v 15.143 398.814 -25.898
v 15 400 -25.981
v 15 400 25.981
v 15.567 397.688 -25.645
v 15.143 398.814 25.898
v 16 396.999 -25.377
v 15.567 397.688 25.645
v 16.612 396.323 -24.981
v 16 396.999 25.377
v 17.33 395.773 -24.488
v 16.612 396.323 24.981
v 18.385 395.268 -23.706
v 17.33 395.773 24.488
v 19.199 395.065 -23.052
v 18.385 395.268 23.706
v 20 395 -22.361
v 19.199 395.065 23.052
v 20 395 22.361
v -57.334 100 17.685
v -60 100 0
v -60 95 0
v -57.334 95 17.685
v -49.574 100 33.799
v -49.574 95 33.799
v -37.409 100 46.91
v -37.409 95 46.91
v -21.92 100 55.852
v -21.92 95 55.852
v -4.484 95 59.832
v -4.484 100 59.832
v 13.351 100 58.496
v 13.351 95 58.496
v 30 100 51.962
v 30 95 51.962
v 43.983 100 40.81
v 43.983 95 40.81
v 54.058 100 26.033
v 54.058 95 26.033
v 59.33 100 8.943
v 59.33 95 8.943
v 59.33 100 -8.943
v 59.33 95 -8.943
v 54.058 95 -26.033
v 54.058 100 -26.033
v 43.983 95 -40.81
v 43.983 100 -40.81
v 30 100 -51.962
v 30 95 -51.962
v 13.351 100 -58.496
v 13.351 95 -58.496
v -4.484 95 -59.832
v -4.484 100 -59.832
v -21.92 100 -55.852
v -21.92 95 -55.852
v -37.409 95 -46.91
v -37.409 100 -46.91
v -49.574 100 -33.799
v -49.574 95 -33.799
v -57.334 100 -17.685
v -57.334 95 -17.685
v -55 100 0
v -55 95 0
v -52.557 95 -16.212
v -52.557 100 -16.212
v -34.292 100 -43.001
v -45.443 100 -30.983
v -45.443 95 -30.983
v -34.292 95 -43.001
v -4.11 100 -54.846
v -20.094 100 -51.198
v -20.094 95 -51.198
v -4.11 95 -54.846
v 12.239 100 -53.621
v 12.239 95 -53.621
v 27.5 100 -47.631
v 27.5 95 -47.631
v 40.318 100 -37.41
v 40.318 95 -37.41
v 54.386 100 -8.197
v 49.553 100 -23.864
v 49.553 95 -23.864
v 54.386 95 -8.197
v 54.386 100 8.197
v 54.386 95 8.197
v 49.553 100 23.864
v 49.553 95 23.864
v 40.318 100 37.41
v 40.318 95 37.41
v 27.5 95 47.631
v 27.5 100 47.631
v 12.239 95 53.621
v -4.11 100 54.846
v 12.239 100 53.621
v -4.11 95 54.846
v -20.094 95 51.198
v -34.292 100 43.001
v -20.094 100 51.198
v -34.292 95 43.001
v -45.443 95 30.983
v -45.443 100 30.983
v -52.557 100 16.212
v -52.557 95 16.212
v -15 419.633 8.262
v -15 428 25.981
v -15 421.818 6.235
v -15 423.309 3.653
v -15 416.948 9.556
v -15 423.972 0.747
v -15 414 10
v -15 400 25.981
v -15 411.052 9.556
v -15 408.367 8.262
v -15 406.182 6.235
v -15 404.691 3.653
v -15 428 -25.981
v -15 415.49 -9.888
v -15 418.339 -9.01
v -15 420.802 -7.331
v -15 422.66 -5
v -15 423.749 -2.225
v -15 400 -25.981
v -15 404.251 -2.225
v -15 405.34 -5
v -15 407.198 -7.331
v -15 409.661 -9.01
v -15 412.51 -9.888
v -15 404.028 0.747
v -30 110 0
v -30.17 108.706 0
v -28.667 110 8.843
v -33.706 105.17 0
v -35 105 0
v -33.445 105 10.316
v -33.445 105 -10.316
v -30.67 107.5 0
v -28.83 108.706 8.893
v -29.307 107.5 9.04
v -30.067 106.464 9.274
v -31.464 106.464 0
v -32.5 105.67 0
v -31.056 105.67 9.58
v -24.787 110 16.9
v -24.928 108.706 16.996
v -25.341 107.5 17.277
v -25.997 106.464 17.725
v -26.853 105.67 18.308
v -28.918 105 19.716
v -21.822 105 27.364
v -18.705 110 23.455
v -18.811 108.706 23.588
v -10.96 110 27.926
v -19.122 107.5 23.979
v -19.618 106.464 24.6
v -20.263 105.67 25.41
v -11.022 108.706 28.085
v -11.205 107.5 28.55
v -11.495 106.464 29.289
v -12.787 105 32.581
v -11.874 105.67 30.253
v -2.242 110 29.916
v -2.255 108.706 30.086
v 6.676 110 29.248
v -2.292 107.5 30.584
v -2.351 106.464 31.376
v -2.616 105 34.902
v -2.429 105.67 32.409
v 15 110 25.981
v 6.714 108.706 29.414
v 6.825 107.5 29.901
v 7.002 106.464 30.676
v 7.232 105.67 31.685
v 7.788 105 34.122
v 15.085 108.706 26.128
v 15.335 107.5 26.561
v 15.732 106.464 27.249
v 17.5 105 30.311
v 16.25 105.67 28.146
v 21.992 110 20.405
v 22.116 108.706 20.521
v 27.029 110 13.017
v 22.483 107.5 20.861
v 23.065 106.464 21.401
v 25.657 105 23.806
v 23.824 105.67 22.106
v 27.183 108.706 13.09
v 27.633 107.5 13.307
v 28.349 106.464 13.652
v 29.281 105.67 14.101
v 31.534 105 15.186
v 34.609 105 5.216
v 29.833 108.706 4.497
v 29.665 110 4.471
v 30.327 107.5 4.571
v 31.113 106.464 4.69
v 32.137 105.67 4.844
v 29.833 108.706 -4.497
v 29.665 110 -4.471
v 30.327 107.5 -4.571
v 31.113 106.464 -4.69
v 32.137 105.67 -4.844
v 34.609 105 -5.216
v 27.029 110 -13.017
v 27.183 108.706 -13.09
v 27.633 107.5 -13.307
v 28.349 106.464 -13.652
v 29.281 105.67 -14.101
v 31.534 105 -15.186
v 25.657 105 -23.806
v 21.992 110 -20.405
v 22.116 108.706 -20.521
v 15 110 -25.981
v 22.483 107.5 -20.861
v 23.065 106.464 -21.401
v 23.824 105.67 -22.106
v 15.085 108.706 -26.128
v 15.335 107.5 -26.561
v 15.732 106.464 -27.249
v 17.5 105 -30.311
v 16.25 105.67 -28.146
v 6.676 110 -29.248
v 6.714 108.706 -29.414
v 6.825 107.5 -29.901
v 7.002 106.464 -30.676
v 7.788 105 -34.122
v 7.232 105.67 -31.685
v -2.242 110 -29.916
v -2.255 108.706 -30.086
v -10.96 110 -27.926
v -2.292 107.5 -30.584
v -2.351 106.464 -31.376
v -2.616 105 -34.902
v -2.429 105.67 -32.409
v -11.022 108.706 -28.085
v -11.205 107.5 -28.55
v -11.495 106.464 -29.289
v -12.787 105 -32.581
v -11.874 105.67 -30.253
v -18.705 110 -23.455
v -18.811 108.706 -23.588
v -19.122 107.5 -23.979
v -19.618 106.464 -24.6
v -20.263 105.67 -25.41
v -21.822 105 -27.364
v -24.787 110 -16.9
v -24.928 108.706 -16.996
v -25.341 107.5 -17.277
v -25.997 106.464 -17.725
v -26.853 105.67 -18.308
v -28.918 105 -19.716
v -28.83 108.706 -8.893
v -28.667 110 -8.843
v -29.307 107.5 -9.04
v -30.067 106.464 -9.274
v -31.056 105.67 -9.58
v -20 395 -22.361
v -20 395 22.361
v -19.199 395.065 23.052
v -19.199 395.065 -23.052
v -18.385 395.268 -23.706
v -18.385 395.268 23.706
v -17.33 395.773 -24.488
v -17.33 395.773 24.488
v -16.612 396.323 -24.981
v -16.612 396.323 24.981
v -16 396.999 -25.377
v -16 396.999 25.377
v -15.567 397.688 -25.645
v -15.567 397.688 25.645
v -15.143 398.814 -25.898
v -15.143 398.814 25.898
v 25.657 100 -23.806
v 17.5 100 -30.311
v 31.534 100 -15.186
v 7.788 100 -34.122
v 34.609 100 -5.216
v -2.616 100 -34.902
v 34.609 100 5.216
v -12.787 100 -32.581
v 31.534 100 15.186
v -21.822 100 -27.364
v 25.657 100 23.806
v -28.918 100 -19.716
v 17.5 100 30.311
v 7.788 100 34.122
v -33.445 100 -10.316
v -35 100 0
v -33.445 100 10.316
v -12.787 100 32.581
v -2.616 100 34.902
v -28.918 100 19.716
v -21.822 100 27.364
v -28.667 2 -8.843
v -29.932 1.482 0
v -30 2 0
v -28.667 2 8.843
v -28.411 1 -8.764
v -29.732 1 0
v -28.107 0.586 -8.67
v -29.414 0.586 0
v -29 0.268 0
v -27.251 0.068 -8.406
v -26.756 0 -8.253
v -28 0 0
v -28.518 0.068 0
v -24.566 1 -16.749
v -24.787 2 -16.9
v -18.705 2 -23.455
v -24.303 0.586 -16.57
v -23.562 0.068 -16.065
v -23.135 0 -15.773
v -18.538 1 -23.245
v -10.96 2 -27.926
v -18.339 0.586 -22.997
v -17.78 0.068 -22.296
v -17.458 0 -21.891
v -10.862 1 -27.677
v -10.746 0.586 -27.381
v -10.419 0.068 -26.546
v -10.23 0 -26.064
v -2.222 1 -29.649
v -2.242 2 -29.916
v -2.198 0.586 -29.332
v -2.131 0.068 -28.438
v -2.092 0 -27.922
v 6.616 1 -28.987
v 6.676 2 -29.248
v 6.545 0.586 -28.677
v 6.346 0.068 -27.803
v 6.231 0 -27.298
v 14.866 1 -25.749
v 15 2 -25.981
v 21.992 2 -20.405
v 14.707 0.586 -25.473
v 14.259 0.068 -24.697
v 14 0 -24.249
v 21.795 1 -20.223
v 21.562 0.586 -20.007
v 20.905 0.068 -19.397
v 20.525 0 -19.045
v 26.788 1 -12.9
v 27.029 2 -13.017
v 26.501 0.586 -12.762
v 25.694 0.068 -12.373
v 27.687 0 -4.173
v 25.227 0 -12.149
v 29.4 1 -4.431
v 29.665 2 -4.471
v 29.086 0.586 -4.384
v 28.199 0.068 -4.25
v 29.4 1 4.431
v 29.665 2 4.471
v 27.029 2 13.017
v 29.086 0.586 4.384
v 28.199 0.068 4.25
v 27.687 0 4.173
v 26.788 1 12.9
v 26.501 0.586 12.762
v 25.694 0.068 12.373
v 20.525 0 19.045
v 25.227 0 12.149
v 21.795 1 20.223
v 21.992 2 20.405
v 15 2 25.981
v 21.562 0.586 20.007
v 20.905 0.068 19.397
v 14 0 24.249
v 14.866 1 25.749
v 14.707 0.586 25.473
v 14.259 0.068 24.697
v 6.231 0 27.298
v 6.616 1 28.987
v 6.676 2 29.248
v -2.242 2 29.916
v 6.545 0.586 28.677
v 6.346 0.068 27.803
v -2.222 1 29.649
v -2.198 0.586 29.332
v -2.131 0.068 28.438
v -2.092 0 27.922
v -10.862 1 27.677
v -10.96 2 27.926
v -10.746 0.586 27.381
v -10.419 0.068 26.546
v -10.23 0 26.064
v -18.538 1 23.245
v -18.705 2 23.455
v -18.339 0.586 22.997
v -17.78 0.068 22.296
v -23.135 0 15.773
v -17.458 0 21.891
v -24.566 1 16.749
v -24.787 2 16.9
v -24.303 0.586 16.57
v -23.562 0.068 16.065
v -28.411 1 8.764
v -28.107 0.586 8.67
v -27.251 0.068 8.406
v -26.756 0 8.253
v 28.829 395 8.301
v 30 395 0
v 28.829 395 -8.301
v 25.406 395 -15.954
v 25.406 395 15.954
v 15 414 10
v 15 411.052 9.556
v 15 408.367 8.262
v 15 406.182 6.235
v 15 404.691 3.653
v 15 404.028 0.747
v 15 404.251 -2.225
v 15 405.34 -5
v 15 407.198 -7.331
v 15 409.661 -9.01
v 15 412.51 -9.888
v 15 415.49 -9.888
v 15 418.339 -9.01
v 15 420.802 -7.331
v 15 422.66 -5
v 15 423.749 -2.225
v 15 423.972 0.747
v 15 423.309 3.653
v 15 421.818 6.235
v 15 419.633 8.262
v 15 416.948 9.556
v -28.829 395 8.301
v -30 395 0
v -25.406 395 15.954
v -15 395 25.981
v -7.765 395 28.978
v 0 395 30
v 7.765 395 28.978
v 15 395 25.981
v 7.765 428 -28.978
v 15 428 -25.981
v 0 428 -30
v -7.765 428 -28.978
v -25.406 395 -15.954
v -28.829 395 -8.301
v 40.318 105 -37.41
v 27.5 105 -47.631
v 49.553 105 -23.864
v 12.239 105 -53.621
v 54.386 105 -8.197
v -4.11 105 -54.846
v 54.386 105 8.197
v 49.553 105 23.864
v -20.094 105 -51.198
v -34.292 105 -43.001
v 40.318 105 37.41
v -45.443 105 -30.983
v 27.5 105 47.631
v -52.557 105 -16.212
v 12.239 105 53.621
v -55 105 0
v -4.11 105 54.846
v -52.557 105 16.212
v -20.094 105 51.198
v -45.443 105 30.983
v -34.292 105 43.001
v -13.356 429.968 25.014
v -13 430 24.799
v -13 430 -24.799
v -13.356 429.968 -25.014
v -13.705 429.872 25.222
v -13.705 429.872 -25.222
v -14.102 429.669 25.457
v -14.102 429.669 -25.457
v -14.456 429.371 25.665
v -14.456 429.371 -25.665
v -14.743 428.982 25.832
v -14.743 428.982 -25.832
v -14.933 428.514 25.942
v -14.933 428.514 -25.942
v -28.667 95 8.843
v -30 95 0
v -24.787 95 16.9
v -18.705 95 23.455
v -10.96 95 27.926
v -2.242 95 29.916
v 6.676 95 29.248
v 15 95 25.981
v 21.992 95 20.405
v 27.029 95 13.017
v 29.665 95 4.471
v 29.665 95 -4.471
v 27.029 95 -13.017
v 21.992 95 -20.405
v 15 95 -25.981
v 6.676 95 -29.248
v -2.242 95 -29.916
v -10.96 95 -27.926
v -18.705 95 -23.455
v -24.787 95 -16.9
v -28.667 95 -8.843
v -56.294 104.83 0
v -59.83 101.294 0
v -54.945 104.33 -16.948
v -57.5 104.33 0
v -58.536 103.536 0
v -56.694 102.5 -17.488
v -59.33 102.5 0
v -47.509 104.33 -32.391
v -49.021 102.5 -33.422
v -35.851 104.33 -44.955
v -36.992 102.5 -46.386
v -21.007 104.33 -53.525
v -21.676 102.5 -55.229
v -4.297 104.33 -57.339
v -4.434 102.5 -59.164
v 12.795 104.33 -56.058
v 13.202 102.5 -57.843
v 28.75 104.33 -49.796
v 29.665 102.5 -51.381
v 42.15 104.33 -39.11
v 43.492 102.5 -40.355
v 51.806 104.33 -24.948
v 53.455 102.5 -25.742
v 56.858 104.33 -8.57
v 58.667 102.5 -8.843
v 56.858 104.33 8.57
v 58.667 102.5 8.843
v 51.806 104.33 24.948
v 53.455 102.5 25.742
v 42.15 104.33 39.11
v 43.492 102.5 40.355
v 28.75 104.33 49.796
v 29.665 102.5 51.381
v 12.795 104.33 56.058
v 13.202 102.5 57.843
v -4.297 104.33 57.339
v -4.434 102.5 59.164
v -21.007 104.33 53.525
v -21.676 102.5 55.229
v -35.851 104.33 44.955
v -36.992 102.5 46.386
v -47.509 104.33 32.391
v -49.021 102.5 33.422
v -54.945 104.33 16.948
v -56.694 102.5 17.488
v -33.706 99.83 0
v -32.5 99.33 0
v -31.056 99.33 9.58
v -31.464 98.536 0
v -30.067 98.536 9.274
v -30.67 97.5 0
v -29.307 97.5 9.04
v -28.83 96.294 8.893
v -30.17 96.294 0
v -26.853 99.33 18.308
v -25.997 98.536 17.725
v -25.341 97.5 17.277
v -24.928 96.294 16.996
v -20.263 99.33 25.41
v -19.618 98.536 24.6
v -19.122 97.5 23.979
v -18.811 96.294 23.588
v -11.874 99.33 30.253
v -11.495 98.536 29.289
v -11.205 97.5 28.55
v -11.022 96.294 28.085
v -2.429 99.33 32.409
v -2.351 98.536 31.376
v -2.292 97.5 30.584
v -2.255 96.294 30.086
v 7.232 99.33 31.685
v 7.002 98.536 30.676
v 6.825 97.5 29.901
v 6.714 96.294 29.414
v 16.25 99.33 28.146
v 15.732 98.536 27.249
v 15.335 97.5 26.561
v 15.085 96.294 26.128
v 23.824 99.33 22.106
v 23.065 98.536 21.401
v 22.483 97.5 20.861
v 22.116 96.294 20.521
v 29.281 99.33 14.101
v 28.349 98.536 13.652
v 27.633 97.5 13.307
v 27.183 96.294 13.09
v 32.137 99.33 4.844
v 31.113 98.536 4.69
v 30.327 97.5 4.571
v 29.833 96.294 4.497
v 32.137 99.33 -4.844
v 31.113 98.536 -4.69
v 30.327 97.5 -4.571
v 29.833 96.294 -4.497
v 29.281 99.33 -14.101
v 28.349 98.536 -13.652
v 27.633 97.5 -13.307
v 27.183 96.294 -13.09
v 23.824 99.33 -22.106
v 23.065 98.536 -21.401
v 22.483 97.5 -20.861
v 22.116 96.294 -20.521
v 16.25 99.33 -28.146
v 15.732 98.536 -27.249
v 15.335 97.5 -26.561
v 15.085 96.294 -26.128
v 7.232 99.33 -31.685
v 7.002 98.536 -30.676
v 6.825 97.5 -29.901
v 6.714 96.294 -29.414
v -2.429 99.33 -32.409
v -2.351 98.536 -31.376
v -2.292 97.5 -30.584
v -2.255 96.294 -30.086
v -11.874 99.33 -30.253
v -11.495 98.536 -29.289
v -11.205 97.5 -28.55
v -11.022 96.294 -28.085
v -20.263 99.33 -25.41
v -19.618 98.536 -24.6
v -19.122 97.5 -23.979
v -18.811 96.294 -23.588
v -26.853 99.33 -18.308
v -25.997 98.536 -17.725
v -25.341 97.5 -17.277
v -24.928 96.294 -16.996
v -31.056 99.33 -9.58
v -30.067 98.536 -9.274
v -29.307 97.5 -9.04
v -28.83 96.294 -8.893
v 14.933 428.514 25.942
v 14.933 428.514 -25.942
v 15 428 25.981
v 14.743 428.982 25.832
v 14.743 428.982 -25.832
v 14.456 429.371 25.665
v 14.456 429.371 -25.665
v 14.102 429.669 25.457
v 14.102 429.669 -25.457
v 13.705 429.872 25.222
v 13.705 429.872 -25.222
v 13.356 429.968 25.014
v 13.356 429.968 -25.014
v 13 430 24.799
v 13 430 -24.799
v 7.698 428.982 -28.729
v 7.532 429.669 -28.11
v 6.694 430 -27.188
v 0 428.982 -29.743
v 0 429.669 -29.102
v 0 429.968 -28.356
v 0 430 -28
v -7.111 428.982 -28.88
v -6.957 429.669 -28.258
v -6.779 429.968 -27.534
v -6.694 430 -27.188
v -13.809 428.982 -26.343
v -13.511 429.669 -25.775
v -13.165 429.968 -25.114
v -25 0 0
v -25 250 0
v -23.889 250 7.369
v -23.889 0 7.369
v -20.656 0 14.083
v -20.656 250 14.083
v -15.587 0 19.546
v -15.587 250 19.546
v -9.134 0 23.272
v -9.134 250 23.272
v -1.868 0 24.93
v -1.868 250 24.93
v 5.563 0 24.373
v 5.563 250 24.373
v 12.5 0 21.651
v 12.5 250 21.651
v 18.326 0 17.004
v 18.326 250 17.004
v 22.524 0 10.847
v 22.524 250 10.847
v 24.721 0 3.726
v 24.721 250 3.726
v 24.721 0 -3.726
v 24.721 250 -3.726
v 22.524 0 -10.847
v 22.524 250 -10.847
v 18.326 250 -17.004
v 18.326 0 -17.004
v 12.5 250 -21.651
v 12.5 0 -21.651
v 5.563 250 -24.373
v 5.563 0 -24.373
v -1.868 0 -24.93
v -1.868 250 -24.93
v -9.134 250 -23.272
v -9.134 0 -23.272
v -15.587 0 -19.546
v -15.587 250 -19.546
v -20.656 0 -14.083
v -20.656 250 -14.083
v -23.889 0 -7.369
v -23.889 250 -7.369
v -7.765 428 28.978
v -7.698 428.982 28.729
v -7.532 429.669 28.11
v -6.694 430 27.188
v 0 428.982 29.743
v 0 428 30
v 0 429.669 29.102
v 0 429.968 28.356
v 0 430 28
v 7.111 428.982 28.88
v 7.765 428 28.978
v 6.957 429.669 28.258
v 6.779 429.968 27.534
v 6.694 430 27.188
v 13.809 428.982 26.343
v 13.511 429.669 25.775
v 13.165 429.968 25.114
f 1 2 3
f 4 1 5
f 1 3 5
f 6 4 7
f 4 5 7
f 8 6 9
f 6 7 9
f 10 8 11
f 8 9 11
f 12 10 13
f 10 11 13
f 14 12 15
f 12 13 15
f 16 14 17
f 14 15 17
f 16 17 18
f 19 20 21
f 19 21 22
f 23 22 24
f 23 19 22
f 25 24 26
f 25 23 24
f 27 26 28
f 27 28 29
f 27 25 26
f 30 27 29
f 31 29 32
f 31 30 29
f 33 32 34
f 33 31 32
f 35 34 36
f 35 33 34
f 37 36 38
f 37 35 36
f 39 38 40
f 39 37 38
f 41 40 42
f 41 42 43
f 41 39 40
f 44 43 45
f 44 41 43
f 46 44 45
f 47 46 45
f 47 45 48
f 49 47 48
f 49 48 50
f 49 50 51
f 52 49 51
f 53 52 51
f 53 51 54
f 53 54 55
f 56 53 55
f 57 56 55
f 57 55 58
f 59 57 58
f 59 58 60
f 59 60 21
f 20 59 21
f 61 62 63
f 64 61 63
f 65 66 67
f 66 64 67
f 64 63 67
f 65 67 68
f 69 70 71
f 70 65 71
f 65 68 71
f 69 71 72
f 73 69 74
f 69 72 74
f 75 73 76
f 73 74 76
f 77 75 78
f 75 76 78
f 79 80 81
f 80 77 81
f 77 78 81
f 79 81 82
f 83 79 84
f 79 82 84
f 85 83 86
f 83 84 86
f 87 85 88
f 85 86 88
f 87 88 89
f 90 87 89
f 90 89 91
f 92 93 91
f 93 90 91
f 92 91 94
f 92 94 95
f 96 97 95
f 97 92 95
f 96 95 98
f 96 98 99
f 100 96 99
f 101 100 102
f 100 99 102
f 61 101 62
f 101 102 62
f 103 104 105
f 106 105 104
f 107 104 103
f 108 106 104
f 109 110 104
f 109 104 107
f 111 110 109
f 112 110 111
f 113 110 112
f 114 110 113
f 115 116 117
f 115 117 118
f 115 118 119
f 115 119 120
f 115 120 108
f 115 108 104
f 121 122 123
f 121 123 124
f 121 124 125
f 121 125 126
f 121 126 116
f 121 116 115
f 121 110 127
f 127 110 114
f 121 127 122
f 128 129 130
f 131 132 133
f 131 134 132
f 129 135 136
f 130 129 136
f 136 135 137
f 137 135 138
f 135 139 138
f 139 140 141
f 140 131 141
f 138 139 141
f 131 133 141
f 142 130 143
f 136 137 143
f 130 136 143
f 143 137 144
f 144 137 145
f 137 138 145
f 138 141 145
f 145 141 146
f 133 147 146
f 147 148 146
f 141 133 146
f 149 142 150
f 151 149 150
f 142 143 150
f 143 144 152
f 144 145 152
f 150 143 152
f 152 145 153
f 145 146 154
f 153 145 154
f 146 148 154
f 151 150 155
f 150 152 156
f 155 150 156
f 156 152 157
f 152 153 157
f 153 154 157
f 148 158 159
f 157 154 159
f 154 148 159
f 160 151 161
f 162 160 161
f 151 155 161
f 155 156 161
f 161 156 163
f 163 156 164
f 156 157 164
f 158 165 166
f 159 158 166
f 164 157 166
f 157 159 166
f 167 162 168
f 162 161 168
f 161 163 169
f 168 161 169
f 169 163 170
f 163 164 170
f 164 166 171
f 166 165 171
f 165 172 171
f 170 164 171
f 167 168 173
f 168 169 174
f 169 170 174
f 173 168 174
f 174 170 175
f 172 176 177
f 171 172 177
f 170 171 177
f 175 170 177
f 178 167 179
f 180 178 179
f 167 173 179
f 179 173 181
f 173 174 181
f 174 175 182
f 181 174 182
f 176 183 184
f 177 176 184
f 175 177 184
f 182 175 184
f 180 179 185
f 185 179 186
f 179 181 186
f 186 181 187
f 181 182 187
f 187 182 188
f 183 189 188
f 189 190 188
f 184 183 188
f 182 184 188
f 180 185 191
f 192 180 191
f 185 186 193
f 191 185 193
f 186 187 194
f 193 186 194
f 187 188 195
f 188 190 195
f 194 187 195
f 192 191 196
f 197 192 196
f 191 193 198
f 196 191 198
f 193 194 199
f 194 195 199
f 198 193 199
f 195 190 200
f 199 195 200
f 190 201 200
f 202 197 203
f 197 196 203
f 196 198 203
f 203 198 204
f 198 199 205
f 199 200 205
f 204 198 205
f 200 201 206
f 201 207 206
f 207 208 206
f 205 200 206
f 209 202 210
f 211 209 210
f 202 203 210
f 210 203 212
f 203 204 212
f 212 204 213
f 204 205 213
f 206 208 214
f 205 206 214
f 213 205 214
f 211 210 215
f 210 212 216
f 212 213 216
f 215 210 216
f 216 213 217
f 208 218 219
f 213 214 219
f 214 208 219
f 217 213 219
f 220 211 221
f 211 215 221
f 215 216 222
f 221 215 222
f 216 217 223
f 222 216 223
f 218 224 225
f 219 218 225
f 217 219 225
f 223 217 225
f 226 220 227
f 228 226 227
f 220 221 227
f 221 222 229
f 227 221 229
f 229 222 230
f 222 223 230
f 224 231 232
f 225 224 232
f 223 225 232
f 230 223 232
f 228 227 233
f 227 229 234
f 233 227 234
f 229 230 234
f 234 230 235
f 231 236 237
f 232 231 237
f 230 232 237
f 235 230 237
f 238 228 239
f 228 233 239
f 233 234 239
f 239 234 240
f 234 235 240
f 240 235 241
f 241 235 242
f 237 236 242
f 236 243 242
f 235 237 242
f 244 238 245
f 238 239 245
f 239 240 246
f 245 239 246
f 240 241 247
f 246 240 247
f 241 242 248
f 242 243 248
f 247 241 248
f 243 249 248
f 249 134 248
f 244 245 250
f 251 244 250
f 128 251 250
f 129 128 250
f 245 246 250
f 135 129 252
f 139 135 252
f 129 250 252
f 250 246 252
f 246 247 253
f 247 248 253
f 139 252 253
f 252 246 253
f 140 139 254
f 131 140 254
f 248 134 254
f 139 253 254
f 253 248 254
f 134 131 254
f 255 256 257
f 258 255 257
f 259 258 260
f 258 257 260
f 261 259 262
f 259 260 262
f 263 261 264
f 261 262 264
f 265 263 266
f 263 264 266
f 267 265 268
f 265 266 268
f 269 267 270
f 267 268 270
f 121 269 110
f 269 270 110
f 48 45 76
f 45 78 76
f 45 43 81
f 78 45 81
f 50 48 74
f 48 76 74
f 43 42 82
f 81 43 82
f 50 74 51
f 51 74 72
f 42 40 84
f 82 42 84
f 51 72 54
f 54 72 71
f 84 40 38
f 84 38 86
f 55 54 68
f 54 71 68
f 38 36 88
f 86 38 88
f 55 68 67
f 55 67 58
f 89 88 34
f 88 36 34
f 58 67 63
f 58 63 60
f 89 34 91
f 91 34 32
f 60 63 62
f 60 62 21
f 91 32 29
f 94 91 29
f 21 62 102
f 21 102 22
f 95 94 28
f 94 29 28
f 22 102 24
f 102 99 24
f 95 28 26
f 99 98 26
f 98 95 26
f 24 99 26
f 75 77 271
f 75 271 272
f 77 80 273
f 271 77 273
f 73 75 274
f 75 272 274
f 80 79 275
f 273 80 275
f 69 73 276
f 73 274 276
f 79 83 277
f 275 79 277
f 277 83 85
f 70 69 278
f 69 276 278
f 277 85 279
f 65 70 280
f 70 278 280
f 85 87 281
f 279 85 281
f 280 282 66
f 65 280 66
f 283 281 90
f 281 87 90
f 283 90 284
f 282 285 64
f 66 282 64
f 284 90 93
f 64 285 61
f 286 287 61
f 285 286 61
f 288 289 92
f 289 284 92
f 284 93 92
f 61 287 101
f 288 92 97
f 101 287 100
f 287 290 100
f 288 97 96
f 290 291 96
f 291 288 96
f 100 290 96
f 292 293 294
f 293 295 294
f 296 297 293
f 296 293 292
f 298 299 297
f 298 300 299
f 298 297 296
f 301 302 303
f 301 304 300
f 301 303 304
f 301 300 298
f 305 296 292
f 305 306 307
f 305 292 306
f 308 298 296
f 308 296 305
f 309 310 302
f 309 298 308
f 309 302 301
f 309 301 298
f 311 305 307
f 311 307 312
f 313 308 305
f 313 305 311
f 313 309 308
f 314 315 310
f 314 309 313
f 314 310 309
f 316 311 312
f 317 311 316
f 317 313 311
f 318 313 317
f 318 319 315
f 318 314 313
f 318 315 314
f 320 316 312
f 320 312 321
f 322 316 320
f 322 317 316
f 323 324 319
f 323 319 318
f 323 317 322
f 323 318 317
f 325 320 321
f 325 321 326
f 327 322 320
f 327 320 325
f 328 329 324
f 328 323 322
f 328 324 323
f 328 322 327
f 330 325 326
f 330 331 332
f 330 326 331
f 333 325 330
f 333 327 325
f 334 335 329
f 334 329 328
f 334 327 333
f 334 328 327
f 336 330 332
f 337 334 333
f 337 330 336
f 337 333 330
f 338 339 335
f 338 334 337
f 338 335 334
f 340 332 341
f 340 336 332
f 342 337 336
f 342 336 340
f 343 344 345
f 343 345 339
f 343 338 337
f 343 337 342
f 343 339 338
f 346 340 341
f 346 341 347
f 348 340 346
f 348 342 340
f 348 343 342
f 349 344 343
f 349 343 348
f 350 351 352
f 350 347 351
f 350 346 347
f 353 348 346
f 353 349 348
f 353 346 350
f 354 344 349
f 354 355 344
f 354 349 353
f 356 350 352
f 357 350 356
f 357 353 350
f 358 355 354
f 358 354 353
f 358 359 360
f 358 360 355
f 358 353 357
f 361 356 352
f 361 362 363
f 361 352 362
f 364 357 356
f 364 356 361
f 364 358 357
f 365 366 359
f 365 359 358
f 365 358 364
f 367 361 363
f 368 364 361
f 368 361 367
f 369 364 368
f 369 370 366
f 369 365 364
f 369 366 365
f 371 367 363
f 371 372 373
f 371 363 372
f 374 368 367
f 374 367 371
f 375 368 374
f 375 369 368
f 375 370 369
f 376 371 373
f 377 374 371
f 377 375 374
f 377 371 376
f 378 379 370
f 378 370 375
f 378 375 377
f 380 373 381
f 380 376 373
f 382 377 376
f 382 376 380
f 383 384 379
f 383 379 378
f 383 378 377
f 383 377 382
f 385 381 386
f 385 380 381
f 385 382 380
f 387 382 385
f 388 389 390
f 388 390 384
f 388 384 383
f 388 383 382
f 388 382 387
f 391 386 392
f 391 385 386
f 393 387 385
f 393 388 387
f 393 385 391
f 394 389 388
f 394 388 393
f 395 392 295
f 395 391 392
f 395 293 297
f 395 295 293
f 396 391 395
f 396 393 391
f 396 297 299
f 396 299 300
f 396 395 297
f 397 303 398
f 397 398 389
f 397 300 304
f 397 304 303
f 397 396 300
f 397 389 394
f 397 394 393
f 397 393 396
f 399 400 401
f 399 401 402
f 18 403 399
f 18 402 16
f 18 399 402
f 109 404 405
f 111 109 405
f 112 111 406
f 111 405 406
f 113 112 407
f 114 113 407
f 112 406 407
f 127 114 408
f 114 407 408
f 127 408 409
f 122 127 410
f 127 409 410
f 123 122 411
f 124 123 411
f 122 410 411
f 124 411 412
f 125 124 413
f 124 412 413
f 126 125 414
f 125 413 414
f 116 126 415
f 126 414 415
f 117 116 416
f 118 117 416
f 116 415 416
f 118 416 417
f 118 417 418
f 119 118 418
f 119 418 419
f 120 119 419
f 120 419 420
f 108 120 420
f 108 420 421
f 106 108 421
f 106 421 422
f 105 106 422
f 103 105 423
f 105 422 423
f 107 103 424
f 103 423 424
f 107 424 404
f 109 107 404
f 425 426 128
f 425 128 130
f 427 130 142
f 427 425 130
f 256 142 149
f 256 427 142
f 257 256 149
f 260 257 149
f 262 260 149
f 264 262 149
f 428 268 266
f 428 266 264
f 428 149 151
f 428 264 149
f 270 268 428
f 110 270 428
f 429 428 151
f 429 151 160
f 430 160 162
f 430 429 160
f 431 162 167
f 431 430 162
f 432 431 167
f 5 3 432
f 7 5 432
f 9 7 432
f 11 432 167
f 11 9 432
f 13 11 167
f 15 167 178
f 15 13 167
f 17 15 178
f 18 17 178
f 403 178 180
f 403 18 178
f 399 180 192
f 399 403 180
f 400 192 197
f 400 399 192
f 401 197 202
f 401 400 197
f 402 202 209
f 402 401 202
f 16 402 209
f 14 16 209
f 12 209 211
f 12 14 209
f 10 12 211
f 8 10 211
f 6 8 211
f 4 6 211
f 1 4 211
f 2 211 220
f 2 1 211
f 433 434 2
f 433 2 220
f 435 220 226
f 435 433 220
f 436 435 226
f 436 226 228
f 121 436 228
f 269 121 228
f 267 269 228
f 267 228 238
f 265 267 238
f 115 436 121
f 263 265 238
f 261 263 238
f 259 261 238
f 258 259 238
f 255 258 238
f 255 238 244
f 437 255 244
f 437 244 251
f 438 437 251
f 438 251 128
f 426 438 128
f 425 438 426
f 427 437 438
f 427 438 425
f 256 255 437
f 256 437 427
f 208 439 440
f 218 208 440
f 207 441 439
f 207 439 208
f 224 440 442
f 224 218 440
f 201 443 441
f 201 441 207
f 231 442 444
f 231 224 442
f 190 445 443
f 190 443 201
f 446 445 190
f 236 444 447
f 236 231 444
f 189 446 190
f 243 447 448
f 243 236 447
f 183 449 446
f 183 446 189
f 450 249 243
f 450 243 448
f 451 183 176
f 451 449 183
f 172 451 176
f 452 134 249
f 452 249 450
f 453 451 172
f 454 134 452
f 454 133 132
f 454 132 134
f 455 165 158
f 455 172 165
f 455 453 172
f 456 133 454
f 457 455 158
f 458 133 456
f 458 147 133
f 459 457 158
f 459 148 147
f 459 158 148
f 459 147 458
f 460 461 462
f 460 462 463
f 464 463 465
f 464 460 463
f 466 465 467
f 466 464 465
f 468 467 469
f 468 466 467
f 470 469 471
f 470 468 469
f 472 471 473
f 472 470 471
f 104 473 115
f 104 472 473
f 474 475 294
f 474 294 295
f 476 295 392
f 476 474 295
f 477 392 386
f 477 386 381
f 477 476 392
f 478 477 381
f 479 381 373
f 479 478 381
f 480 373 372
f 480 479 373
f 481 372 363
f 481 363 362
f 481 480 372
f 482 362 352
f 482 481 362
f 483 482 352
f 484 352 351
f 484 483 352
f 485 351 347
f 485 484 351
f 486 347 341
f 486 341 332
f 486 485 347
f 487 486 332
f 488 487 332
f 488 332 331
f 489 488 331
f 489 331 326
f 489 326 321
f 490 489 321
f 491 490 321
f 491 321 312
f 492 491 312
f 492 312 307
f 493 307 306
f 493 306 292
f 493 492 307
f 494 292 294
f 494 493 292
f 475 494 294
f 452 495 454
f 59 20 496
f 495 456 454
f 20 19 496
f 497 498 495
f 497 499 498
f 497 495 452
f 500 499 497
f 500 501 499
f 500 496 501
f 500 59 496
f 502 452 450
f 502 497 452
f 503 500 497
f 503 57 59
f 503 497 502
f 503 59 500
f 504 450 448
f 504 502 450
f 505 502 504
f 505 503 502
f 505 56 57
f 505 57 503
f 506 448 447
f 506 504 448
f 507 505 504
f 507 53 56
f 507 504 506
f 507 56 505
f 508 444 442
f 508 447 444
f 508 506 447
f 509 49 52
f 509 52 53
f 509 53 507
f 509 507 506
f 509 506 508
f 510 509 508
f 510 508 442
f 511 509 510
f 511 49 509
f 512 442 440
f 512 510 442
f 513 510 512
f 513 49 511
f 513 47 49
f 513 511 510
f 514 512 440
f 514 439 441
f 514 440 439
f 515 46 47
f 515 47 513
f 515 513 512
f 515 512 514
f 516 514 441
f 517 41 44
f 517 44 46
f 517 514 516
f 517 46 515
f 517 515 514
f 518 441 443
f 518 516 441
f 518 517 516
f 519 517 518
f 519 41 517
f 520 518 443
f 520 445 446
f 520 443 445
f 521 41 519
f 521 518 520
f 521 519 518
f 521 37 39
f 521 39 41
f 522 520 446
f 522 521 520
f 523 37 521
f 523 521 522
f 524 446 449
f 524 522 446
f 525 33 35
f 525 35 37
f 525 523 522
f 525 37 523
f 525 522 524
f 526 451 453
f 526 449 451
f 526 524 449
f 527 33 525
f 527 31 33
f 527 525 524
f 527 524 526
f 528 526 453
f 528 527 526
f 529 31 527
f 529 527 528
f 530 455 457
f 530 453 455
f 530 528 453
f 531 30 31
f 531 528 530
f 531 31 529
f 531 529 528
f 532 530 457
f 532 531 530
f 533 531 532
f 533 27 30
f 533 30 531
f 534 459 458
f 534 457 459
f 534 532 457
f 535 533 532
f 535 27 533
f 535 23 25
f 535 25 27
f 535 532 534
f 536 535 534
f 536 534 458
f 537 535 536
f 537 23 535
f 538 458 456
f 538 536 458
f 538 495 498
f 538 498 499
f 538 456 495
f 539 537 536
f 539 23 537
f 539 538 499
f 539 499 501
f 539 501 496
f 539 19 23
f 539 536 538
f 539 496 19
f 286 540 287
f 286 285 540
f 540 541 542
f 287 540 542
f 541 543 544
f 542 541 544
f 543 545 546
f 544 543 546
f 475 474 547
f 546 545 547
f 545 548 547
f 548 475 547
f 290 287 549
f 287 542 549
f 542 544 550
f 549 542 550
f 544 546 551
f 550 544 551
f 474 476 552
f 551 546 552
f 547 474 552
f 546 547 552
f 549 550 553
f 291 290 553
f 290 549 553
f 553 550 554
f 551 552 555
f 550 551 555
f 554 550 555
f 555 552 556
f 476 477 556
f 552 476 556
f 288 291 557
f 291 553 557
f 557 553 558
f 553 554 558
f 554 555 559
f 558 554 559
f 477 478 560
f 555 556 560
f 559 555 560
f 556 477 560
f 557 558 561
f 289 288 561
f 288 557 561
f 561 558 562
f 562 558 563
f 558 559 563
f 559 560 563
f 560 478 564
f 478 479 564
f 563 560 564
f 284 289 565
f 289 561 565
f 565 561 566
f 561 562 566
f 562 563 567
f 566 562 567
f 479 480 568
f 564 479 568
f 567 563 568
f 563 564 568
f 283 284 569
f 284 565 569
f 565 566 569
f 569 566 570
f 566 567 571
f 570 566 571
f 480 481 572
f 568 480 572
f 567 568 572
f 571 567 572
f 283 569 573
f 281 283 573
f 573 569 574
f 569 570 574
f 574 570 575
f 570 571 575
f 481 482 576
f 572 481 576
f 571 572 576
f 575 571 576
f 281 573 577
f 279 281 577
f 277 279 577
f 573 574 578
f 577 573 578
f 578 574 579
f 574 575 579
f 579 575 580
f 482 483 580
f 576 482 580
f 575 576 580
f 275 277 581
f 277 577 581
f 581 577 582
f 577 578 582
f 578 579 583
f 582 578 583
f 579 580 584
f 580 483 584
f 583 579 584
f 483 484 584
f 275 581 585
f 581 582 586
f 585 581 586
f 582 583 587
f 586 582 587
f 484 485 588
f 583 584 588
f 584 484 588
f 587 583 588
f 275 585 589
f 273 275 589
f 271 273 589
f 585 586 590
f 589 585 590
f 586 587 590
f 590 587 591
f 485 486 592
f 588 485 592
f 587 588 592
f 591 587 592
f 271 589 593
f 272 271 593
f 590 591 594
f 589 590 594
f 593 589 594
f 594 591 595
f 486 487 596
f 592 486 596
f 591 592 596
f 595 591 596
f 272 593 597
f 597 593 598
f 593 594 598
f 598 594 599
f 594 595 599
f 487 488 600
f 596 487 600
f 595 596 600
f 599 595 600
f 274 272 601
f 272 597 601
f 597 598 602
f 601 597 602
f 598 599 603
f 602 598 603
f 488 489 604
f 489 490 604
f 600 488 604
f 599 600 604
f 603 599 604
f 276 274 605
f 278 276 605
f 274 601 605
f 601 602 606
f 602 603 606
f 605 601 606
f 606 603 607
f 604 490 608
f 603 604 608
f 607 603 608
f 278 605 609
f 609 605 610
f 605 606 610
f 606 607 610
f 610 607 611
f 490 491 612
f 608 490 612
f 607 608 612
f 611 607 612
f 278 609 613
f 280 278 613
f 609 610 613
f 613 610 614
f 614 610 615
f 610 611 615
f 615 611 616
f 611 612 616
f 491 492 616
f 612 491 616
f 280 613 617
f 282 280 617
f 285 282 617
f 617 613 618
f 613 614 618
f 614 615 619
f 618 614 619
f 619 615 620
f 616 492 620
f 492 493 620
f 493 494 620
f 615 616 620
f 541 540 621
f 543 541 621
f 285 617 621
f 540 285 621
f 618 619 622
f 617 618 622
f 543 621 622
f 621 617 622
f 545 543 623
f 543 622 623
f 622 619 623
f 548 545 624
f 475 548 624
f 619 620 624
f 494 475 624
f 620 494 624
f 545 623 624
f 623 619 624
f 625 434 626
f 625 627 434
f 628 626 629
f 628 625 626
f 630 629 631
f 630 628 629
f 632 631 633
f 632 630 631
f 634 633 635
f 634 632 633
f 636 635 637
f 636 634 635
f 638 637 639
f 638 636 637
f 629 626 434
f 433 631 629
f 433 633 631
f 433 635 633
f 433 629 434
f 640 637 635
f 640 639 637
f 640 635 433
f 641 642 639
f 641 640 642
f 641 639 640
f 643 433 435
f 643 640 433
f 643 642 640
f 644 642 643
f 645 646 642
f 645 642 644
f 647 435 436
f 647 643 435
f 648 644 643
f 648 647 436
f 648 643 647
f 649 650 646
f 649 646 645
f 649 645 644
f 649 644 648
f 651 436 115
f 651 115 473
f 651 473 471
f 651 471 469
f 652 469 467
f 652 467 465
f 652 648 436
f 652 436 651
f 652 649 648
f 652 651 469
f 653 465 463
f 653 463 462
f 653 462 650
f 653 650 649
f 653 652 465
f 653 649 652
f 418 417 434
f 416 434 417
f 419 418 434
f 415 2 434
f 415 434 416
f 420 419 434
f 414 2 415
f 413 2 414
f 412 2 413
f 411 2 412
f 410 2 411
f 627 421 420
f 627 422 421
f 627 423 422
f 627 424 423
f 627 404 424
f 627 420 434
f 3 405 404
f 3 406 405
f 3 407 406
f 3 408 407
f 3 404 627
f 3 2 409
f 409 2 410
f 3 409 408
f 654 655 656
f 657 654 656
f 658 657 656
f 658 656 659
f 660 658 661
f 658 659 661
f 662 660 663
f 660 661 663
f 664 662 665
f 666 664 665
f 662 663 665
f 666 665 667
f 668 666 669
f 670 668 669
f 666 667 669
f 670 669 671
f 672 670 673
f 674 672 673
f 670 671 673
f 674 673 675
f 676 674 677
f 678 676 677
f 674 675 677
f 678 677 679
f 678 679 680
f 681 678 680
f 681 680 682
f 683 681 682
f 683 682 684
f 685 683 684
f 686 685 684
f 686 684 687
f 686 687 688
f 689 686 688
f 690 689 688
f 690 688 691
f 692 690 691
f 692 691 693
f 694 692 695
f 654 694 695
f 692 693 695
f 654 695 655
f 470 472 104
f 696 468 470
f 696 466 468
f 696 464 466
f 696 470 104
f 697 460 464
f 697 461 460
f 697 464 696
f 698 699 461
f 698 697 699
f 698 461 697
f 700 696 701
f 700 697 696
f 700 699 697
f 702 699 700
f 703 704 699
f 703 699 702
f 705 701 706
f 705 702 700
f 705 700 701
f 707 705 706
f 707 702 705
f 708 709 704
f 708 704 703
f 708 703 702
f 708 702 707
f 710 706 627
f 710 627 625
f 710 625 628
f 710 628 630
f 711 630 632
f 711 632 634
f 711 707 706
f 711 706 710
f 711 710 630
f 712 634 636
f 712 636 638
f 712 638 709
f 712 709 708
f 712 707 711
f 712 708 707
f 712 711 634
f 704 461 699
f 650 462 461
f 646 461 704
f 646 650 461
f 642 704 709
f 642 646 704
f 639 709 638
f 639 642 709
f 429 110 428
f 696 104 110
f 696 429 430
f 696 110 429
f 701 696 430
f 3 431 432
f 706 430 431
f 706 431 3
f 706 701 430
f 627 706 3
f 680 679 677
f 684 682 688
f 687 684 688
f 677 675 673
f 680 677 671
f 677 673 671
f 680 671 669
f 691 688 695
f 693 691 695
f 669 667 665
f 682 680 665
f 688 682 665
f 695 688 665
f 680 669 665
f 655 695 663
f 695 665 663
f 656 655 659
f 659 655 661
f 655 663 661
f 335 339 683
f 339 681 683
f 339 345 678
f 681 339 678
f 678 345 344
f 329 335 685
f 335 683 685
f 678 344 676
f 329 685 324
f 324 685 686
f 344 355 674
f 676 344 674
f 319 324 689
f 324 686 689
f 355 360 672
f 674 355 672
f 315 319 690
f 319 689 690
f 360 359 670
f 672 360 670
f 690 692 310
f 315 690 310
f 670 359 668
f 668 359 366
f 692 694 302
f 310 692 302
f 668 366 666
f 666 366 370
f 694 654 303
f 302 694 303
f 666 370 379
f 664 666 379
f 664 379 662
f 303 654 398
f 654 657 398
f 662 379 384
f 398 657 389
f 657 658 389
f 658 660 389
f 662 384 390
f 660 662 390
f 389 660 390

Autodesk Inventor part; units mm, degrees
ref_plane "YZ Plane" through (0, 0, 0) normal (1, 0, 0) x (0, 1, 0)
ref_plane "XZ Plane" through (0, 0, 0) normal (0, 1, 0) x (-1, 0, 0)
ref_plane "XY Plane" through (0, 0, 0) normal (0, 0, 1) x (1, 0, 0)
sketch "Sketch1" plane through (0, 0, 0) normal (0, 0, 1) x (1, 0, 0)
  line L0 (25, 0) -> (30, 0)
  line L1 (30, 0) -> (30, 100)
  line L2 (30, 100) -> (55, 100)
  line L3 (55, 100) -> (55, 95)
  line L4 (55, 95) -> (60, 95)
  line L5 (60, 95) -> (60, 105)
  line L6 (60, 105) -> (30, 105)
  line L7 (30, 105) -> (30, 395)
  line L8 (30, 395) -> (0, 395)
  line L9 (0, 250) -> (0, 395)
  line L10 (25, 0) -> (25, 250)
  line L11 (25, 250) -> (0, 250)
  line L12 (0, 0) -> (0, 395)
  dimension "d0" = 25
  dimension "d1" = 5
  dimension "d2" = 100
  dimension "d3" = 25
  dimension "d4" = 5
  dimension "d5" = 5
  dimension "d6" = 10
  dimension "d7" = 290
  dimension "d8" = 250
revolve "Revolution1" add sketch "Sketch1" angle 360 mid plane about axis through (0, 0, 0) along (0, 1, 0)
fillet "Fillet1" radius 5 3 edges at (30, 105, 0) (60, 105, 0) (30, 100, 0)
sketch "Sketch2" plane through (0, 395, 0) normal (0, 1, 0) x (1, 0, 0)
  line L0 (15, 0) -> (-15, 0)
  circle A0 centre (0, 0) radius 25 projected
  circle A1 centre (0, 0) radius 30 projected
  line L1 (-15, -25.9808) -> (-15, 25.9808)
  line L2 (15, 0) -> (15, -25.9808)
  line L3 (15, -25.9808) -> (15, 25.9808)
  arc A2 (15, 25.9808) -> (-15, 25.9808) centre (0, 0) ccw
  arc A3 (-15, -25.9808) -> (15, -25.9808) centre (0, 0) ccw
  dimension "d11" = 15
  dimension "d12" = 30
extrude "Extrusion1" add sketch "Sketch2" along normal blind 35 contours L2 A0 L1 L0 | L0 L1 A0 L3 | L2 A1 L1 A0 | A0 L1 A1 L3
fillet "Fillet2" radius 2 4 edges at (-15, 430, 0) (15, 430, 12.9904) (0, 430, -30) (0, 430, 30)
fillet "Fillet3" radius 5 2 edges at (-15, 395, 0) (15, 395, 12.9904)
sketch "Sketch3" plane through (-15, 428, -25.9808) normal (-1, 0, 0) x (0, 0, 1)
  line L0 (0, -28) -> (0, 0) projected
  line L1 (0, 0) -> (51.9615, 0) projected
  line L2 (0, -28) -> (51.9615, -28) projected
  circle A0 centre (25.9808, -14) radius 10
  point P0 (25.9808, -428)
  dimension "d17" = 20
hole "Hole1" at (-15, 414, 0) direction (1, 0, 0) diameter 20 end through all
fillet "Fillet4" radius 2 1 edges at (30, 0, 0)
properties part number "shield" material "Steel, High Strength, Low Alloy"
